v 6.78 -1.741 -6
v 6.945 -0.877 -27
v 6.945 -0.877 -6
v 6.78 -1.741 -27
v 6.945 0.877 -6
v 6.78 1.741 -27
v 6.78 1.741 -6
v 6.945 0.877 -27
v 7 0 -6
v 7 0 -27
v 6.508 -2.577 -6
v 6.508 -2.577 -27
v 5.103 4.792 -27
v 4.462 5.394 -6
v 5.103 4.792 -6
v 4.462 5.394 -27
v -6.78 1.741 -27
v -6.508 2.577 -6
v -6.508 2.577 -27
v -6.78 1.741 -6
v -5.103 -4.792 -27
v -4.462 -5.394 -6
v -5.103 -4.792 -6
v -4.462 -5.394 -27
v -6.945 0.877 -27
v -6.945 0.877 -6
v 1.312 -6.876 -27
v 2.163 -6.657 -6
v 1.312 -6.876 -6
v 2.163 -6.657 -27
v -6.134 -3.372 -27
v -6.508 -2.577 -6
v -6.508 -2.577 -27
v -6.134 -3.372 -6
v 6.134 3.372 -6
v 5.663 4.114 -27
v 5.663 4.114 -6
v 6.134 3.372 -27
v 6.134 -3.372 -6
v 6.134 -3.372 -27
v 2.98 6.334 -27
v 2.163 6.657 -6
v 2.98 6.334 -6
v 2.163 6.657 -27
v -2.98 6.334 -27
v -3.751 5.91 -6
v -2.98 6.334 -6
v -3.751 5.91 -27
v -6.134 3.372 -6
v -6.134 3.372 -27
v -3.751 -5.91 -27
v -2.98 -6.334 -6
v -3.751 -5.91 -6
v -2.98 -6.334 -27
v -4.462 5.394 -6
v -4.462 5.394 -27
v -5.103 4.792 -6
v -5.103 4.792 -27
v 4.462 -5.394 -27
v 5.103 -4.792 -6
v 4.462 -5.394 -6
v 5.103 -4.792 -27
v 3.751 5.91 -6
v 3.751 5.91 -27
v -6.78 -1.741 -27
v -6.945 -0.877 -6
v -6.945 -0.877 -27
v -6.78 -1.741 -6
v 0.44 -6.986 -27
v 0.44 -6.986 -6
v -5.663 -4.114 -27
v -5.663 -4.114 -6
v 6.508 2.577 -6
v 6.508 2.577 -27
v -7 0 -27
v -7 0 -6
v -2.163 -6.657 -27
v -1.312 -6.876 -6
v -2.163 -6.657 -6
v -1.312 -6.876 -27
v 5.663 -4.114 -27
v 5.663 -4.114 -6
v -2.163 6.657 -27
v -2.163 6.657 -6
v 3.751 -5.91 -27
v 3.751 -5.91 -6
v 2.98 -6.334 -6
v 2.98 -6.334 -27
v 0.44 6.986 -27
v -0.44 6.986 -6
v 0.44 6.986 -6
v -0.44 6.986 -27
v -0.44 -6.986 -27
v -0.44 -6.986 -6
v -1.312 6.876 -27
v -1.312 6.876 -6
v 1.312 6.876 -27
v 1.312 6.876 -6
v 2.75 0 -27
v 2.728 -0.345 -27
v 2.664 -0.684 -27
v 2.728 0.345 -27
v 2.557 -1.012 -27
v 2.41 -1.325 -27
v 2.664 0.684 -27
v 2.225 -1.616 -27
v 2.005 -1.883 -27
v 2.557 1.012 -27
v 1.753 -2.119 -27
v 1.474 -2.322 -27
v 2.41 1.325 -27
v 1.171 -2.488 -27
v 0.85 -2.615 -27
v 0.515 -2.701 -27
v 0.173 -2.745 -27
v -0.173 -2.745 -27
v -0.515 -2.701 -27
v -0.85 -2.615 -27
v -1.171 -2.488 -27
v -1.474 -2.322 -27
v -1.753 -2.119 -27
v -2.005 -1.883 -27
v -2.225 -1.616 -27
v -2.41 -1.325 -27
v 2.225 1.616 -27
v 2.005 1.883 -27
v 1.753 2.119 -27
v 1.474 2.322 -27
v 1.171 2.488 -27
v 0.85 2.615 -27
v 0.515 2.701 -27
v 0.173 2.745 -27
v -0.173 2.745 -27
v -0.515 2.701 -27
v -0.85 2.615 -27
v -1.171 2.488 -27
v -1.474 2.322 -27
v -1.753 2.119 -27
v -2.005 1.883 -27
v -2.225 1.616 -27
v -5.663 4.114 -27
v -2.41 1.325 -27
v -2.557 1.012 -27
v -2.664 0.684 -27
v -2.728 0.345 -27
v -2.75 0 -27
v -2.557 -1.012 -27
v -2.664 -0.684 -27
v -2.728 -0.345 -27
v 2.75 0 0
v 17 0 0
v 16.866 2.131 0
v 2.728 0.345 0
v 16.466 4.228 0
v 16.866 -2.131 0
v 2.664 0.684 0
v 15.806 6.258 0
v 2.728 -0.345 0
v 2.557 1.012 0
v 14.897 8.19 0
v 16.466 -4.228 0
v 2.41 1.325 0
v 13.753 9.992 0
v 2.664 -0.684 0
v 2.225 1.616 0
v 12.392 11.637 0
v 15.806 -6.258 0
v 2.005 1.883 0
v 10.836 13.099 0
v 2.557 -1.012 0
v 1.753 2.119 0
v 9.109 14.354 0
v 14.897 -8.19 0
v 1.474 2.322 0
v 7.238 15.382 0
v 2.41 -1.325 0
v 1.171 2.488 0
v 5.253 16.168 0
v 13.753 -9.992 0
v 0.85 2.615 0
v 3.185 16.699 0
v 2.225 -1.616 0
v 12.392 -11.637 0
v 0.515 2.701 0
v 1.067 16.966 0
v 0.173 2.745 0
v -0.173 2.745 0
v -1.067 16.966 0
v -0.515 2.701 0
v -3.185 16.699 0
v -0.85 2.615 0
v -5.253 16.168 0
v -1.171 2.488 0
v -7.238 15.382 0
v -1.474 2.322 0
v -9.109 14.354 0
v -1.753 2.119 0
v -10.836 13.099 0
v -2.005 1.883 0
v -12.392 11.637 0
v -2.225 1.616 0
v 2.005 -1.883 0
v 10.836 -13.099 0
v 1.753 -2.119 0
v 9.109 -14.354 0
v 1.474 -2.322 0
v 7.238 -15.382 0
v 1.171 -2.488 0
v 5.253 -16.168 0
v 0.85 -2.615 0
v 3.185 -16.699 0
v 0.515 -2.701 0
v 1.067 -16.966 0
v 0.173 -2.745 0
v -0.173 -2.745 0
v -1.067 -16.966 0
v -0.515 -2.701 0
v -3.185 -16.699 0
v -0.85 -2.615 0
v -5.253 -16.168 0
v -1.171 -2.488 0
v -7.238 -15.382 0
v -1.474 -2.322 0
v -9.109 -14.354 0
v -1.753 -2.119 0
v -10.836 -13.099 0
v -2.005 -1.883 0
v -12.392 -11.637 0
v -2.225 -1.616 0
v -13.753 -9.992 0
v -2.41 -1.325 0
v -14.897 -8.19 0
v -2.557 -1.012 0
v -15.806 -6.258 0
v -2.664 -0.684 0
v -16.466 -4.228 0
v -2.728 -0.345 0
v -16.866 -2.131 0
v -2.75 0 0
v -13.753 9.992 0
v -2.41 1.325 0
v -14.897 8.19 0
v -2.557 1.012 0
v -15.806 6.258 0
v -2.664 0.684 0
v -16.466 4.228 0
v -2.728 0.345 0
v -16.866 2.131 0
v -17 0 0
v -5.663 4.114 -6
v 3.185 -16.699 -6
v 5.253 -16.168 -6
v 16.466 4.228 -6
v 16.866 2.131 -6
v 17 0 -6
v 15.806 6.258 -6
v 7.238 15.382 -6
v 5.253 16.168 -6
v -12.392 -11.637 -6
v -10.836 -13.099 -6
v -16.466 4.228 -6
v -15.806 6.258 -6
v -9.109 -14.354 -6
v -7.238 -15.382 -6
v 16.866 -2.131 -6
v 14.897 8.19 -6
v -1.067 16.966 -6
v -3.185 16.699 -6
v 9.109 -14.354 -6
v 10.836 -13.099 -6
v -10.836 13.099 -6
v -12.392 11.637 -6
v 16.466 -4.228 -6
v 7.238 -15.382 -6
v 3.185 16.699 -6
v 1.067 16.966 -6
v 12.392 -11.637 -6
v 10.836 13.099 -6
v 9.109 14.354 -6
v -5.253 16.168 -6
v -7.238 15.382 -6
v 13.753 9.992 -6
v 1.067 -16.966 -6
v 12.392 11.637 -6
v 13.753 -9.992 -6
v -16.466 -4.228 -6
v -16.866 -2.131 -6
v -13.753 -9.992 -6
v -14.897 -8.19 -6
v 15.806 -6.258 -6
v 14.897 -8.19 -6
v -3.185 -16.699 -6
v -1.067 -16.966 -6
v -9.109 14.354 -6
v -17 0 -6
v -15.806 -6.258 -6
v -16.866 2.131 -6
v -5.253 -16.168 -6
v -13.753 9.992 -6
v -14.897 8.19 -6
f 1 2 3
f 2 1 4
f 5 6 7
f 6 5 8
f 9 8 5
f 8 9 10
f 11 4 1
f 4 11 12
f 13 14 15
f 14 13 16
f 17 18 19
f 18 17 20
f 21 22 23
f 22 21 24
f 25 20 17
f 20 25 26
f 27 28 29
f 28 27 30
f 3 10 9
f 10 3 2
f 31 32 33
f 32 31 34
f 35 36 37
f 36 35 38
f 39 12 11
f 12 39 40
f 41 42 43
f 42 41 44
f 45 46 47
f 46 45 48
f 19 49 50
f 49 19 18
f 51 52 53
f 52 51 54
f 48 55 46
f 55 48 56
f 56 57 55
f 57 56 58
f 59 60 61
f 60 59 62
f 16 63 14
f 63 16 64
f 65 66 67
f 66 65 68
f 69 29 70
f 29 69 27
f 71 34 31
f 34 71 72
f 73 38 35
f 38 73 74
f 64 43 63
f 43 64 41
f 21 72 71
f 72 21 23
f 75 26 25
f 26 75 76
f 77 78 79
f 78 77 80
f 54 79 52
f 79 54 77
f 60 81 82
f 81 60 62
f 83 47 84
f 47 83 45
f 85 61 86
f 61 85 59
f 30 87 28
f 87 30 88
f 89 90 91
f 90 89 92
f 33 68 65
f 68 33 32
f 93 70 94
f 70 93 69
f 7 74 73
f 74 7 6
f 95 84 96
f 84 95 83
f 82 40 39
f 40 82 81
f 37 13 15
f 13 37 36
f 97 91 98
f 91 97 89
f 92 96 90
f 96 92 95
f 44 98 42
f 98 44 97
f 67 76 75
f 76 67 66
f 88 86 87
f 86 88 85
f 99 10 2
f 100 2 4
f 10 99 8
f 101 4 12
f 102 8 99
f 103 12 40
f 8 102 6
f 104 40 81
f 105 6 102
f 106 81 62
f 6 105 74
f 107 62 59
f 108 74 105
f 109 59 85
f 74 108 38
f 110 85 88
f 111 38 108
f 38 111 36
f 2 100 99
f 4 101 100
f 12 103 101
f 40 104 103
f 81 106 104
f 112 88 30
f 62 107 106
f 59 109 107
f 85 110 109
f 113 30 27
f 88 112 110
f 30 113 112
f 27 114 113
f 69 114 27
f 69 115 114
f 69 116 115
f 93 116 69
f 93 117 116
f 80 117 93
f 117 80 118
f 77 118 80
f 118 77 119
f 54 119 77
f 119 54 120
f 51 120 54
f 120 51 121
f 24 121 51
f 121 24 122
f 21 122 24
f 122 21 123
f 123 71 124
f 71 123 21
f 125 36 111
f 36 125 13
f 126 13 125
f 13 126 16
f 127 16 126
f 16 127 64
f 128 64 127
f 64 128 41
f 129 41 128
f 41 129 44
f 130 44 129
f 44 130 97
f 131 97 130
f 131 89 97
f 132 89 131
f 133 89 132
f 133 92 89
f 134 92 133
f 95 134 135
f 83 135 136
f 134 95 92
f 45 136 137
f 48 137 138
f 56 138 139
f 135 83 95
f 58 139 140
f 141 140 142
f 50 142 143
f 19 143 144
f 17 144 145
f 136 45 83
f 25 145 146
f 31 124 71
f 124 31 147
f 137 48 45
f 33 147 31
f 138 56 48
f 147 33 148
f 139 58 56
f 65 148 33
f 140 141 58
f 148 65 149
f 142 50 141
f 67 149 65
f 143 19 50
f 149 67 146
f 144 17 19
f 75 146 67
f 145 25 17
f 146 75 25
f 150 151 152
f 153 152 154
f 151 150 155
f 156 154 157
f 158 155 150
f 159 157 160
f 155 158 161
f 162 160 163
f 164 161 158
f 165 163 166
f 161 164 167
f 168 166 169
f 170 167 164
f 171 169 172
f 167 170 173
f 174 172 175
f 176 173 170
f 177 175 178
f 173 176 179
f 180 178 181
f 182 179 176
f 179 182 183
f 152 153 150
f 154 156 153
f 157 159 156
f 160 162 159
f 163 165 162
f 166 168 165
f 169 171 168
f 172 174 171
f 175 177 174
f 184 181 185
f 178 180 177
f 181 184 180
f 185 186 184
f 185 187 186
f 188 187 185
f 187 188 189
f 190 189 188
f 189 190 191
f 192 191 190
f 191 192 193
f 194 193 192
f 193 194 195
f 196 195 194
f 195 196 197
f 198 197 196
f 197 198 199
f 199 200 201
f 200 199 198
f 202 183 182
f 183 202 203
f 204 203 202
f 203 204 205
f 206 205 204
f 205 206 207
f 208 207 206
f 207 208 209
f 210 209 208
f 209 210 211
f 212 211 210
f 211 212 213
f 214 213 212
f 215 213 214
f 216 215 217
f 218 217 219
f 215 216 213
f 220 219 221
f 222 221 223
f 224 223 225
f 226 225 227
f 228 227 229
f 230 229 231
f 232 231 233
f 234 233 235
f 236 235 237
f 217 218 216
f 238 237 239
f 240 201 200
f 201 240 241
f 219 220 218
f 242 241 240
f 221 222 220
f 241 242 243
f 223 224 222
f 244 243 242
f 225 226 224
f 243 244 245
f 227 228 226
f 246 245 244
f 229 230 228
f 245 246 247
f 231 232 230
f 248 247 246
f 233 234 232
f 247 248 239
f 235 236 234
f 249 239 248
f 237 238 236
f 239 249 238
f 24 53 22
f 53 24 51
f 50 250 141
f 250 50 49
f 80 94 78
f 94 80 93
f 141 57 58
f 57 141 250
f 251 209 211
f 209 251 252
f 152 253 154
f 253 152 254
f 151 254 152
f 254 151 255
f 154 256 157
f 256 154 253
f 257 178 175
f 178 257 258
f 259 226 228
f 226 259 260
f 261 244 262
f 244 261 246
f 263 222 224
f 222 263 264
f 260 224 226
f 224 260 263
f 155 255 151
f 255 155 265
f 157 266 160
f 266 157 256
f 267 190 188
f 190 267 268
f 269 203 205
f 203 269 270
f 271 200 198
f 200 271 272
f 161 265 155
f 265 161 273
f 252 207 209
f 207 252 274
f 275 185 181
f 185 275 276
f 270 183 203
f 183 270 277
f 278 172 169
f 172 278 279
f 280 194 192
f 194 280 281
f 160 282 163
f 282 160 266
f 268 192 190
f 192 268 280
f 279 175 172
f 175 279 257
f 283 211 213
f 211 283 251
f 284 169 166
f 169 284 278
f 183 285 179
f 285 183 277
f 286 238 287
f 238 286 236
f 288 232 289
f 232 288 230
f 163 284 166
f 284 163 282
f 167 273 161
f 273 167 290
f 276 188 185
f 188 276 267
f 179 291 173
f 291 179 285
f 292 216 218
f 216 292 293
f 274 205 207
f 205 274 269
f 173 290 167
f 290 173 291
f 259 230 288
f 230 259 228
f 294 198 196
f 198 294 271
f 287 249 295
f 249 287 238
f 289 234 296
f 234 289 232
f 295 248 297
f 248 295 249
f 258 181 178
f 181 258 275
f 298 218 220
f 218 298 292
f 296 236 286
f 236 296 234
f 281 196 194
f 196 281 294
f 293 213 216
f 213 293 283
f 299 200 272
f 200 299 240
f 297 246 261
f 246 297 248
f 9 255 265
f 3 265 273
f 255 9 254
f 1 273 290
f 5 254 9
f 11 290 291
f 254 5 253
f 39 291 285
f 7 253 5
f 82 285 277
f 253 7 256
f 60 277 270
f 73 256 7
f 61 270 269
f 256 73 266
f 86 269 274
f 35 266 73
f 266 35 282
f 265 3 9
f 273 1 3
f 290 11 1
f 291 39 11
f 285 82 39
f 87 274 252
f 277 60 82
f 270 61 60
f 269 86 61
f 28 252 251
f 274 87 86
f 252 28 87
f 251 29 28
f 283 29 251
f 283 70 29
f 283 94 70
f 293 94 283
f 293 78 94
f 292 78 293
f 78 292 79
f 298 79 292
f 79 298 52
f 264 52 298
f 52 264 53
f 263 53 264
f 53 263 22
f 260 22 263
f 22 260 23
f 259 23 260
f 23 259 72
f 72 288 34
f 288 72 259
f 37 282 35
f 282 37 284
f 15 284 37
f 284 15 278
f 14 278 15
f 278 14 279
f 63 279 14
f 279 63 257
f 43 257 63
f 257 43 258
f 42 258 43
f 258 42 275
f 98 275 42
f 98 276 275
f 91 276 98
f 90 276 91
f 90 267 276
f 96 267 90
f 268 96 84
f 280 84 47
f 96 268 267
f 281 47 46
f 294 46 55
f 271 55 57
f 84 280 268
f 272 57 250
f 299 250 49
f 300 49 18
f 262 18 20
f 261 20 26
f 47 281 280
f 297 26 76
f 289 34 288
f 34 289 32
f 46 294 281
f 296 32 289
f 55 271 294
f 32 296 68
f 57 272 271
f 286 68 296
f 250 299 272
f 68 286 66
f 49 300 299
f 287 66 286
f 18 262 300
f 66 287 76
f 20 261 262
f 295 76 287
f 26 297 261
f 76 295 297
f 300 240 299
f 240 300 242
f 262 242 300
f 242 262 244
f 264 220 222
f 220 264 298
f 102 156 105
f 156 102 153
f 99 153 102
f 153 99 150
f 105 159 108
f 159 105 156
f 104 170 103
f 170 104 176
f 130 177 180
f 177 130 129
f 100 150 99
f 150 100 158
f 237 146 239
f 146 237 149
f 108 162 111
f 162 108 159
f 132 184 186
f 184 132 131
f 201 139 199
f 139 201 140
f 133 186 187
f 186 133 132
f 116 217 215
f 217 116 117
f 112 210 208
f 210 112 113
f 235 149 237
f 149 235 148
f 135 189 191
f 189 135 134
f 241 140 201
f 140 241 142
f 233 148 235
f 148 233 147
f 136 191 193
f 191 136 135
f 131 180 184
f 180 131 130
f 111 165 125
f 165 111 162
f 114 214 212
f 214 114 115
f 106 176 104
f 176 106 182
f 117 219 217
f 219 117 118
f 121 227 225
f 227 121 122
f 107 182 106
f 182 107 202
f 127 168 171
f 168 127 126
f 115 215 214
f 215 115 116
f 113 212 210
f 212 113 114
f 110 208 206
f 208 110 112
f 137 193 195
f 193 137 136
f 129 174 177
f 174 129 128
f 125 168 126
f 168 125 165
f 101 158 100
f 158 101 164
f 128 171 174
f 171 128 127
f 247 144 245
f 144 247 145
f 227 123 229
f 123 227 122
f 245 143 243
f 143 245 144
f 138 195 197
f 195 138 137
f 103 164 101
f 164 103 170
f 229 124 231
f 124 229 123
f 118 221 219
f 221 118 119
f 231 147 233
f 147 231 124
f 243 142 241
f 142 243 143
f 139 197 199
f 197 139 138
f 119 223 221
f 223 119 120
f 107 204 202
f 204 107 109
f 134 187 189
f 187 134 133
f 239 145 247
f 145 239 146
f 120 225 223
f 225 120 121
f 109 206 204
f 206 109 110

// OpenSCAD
$fn = 50;


difference() {
	union() {
		translate(v = [0, 0, -27.0000000000]) {
			cylinder(h = 27, r = 7.0000000000);
		}
		translate(v = [0, 0, -6.0000000000]) {
			cylinder(h = 6, r = 17.0000000000);
		}
	}
	union() {
		#translate(v = [0, 0, -27]) {
			cylinder(h = 27, r = 2.7500000000);
		}
	}
}
